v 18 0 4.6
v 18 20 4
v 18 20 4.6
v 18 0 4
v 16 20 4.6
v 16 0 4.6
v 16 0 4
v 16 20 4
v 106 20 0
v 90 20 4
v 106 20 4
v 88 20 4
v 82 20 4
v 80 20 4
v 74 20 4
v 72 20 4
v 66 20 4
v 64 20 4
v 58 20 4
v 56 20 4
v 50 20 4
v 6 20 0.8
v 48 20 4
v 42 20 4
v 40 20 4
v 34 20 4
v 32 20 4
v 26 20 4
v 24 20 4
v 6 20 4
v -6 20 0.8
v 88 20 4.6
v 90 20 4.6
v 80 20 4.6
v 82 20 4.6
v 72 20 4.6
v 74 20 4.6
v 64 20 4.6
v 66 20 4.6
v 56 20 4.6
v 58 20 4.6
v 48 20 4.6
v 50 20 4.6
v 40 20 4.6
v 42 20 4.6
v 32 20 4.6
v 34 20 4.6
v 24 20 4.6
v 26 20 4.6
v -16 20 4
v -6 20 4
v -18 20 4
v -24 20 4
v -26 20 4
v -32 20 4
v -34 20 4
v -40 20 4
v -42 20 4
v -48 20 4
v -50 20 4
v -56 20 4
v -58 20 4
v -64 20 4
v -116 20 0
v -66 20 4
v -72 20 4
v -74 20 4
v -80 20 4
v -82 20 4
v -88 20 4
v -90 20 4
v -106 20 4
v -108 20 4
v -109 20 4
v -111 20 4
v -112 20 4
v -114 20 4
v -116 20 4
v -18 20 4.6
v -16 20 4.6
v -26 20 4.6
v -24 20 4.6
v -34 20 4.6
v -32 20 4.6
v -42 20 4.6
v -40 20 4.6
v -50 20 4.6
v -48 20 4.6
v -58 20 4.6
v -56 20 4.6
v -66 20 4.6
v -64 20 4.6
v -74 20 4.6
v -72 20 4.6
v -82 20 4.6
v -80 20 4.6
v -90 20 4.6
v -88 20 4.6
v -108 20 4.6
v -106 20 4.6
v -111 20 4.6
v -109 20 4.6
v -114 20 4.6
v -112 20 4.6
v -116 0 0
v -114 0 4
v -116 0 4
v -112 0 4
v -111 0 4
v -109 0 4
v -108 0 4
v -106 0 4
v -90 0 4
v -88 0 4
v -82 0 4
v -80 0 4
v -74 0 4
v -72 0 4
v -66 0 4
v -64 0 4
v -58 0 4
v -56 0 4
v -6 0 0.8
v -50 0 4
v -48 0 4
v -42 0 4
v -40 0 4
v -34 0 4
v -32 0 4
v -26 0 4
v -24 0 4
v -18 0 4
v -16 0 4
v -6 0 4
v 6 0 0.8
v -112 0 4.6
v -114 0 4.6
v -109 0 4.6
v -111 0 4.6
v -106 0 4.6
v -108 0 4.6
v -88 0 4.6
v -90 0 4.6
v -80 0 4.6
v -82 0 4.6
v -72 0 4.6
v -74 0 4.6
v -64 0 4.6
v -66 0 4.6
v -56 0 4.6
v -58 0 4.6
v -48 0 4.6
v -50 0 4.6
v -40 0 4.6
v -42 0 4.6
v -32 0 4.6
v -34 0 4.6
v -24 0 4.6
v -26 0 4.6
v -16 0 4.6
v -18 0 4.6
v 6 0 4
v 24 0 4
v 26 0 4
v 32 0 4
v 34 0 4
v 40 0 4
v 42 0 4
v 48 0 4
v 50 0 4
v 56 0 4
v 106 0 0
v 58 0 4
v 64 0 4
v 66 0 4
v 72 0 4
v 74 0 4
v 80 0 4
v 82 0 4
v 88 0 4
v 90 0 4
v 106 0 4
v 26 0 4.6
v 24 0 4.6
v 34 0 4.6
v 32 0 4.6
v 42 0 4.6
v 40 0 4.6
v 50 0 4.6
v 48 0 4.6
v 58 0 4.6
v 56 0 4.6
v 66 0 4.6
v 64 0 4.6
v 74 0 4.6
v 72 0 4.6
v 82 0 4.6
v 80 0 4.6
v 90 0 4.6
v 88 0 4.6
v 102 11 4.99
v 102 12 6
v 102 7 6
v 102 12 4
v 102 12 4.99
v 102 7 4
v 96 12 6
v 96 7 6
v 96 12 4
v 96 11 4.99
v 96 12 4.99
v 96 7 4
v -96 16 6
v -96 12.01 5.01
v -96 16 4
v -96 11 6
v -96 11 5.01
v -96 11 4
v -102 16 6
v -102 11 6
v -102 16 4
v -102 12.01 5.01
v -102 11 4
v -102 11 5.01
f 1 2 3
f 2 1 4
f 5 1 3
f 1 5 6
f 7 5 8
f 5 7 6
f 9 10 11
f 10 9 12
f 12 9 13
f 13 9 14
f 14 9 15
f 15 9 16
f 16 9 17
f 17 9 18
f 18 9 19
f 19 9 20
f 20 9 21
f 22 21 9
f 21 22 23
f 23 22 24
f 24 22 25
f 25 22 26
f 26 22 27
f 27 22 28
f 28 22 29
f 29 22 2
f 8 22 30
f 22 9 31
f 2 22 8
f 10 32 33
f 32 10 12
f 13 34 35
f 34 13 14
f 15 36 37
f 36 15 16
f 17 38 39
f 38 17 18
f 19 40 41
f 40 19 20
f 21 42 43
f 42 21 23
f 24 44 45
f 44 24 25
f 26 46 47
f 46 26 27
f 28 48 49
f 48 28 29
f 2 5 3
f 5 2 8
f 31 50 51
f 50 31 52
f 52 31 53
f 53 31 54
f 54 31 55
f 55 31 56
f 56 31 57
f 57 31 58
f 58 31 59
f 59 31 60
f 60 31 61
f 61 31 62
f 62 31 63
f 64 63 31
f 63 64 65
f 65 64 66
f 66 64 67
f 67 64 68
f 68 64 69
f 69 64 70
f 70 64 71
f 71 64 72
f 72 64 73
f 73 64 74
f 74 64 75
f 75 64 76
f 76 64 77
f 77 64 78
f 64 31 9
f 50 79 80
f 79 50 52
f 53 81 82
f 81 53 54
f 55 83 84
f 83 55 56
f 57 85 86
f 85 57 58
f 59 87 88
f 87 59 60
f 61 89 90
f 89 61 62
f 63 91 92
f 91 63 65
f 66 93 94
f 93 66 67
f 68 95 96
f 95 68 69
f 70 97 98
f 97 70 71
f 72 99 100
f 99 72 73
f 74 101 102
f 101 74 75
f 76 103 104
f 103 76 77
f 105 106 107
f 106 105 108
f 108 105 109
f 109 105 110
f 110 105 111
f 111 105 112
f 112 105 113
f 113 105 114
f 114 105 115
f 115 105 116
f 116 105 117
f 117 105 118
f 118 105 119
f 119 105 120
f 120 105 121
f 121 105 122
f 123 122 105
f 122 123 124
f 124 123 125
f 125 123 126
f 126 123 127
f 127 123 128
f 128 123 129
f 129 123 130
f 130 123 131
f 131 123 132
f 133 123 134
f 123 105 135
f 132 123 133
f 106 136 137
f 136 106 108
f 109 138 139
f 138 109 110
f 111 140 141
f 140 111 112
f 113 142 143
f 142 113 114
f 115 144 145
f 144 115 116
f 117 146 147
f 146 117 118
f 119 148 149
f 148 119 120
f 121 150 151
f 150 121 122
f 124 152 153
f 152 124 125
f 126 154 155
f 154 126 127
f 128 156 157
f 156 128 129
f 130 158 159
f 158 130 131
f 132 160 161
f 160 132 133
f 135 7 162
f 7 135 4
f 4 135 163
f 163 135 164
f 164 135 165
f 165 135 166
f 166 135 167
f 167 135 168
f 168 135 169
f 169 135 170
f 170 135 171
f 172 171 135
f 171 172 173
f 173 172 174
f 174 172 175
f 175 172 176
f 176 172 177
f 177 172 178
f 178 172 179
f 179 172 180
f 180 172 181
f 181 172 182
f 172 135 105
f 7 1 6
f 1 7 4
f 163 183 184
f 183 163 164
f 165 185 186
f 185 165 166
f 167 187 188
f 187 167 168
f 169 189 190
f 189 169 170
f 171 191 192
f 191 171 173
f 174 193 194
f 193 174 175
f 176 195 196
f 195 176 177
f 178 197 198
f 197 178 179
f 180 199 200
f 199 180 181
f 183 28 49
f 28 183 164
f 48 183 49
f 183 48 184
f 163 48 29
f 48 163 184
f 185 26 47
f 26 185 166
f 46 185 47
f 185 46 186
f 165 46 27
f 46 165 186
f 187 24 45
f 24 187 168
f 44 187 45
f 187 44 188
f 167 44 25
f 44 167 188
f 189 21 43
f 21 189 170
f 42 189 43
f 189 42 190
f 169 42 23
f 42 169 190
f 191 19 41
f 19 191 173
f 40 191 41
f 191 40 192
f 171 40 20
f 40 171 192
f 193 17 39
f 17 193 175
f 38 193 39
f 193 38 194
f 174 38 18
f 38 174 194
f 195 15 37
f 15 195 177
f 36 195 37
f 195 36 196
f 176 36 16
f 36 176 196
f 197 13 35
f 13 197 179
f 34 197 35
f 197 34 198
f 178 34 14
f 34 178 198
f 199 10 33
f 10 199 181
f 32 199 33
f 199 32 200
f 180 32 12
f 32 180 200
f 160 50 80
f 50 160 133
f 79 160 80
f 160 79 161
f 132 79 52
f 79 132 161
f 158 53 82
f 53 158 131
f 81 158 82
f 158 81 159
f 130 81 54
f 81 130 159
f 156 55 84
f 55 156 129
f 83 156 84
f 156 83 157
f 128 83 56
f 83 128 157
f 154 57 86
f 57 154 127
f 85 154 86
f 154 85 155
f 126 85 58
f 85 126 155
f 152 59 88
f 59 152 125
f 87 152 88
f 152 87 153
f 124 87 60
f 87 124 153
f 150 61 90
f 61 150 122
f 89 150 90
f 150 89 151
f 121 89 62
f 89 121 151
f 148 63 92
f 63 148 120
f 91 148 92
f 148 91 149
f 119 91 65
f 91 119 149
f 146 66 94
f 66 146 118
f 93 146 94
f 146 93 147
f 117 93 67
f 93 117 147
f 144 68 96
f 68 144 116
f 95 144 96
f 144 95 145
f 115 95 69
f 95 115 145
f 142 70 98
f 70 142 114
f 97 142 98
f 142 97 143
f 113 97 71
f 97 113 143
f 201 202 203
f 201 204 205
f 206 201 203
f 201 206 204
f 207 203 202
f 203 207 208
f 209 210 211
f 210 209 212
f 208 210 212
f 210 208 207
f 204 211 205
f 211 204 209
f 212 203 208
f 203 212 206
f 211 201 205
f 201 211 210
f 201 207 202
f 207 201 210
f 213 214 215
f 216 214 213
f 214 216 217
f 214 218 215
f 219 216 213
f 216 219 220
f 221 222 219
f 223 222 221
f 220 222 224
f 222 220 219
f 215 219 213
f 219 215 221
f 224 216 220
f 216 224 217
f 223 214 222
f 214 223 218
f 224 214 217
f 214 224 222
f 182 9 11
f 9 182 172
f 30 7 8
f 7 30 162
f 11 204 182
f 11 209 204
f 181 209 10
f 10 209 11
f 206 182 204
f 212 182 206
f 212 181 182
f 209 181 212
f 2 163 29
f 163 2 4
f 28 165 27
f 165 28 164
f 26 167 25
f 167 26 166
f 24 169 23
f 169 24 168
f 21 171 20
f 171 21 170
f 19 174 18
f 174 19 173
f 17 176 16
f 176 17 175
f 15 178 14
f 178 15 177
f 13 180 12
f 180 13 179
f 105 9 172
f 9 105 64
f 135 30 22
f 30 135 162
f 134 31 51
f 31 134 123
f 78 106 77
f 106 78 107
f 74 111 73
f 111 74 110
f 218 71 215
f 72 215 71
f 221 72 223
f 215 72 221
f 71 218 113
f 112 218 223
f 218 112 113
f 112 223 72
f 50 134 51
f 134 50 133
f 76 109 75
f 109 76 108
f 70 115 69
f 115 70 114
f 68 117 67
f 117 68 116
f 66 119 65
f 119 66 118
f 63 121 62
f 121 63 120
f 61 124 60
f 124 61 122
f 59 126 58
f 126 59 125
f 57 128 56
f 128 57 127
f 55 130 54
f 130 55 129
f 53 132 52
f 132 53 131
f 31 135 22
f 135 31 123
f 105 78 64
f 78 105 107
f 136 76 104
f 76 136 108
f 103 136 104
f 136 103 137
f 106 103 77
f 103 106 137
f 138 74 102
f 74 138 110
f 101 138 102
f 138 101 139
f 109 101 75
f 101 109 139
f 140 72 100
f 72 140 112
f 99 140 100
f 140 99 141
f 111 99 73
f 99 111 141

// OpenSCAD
// Bag clip with living hinge - PETG, 0.4mm nozzle, no supports
// Printed open flat, closes on 2mm folded bag. Latch hooks shut, thumb tab opens.
// Units: mm. Print orientation: +Z up, rests on z=0.

/* [Parts] */
part = "clip"; // [clip, assembly]

cadverify_only = "";
module instance(name, part, unit = 1) {
    echo(cadverify_instance = [name, part, unit]);
    if (cadverify_only == "" || cadverify_only == name) children();
}

// Parameters
La = 100;      // arm length
W = 20;        // arm width (Y)
Ta = 4;        // arm thickness (Z)
Gh = 12;       // hinge gap in X (-6..6)
Th = 0.8;      // hinge thickness (2x0.4 nozzle)
TabL = 10;     // thumb tab length beyond top arm free end

Xmin = -106 - TabL;  // -116 tab tip
Xmax = 6 + La;       // 106 bottom nose
Ymin = 0; Ymax = W;
Zmin = 0; Zmax = Ta + 2; // 6 latch top

module clip() {
    // bottom arm 6..106
    translate([6, 0, 0]) cube([La, W, Ta]);
    // top arm -106..-6
    translate([-106, 0, 0]) cube([La, W, Ta]);
    // living hinge -6.02..6.02 (overlap into arms), full width, thin
    translate([-Gh/2 - 0.02, 0, 0]) cube([Gh + 0.04, W, Th]);
    // thumb tab -116..-105.98 (overlap into top arm)
    translate([Xmin, 0, 0]) cube([TabL + 0.02, W, Ta]);

    // inner grip teeth 0.6 tall, 2 wide, on inner faces (tops, become inner when closed)
    for (i = [0:9]) translate([16 + i*8, 0, Ta - 0.02]) cube([2, W, 0.62]);
    for (i = [0:9]) translate([-18 - i*8, 0, Ta - 0.02]) cube([2, W, 0.62]);
    // thumb grip ridges on tab top
    translate([-114, 0, Ta - 0.02]) cube([2, W, 0.62]);
    translate([-111, 0, Ta - 0.02]) cube([2, W, 0.62]);
    translate([-108, 0, Ta - 0.02]) cube([2, W, 0.62]);

    // bottom catch block 96..102, 7..12, 3.98..6 with 45deg top-outer chamfer
    difference() {
        translate([96, 7, Ta - 0.02]) cube([6, 5, 2.02]);
        translate([95.99, 0, 11]) rotate([0, 90, 0])
            linear_extrude(height = 6.04)
                polygon(points = [[6.01, 11], [6.01, 12.01], [4.99, 12.01]]);
    }
    // top hook block -102..-96, 11..16, 3.98..6 with 45deg bottom-inner chamfer
    difference() {
        translate([-102, 11, Ta - 0.02]) cube([6, 5, 2.02]);
        translate([-102.02, 0, 9]) rotate([0, 90, 0])
            linear_extrude(height = 6.04)
                polygon(points = [[5.01, 10.99], [3.99, 10.99], [3.99, 12.01]]);
    }
}

module assembly() {
    instance("clip_inst", "clip", 1) clip();
}

if (part == "clip") {
    echo(cadverify_spec = [
        ["bounds", [[Xmin, Ymin, Zmin], [Xmax, Ymax, Zmax]]],
        ["bodies", 1],
        ["support_faces", [["bed", "-z", 4000]]],
        ["overhangs_allowed", []],
        ["copies", 1],
        ["details", [
            ["bottom_arm", "material", [[6, 0, 0], [106, 20, 4]], 0.9],
            ["top_arm", "material", [[-106, 0, 0], [-6, 20, 4]], 0.9],
            ["thumb_tab", "material", [[-116, 0, 0], [-106, 20, 4]], 0.9],
            ["latch_bottom", "material", [[96, 7, 4], [102, 12, 6]], 0.8],
            ["latch_top", "material", [[-102, 11, 4], [-96, 16, 6]], 0.8],
            ["hinge_gap", "void", [[-6, 0, 0.8], [6, 20, 4]], 0.9],
            ["hinge_thin", "thickness", [0, 10, 5], [0, 0, -1], 0.8],
            ["arm_thickness", "thickness", [60, 10, 10], [0, 0, -1], 4.0],
            ["teeth", "view", [[14, 0, 4], [92, 20, 4.8]]],
            ["latch_detail", "view", [[94, 5, 4], [104, 18, 6]]]
        ]]
    ]);
    clip();
} else if (part == "assembly") {
    echo(cadverify_spec = [
        ["bounds", [[Xmin, Ymin, Zmin], [Xmax, Ymax, Zmax]]],
        ["support_faces", [["bed", "-z", 4000]]],
        ["allowed_interferences", []],
        ["motions", [
            ["closing", ["clip_inst"], "slide", [1, 0, 0], [0, 20]]
        ]],
        ["assembly_order", [
            [["clip_inst"], [0, 0, 0]]
        ]]
    ]);
    assembly();
}
